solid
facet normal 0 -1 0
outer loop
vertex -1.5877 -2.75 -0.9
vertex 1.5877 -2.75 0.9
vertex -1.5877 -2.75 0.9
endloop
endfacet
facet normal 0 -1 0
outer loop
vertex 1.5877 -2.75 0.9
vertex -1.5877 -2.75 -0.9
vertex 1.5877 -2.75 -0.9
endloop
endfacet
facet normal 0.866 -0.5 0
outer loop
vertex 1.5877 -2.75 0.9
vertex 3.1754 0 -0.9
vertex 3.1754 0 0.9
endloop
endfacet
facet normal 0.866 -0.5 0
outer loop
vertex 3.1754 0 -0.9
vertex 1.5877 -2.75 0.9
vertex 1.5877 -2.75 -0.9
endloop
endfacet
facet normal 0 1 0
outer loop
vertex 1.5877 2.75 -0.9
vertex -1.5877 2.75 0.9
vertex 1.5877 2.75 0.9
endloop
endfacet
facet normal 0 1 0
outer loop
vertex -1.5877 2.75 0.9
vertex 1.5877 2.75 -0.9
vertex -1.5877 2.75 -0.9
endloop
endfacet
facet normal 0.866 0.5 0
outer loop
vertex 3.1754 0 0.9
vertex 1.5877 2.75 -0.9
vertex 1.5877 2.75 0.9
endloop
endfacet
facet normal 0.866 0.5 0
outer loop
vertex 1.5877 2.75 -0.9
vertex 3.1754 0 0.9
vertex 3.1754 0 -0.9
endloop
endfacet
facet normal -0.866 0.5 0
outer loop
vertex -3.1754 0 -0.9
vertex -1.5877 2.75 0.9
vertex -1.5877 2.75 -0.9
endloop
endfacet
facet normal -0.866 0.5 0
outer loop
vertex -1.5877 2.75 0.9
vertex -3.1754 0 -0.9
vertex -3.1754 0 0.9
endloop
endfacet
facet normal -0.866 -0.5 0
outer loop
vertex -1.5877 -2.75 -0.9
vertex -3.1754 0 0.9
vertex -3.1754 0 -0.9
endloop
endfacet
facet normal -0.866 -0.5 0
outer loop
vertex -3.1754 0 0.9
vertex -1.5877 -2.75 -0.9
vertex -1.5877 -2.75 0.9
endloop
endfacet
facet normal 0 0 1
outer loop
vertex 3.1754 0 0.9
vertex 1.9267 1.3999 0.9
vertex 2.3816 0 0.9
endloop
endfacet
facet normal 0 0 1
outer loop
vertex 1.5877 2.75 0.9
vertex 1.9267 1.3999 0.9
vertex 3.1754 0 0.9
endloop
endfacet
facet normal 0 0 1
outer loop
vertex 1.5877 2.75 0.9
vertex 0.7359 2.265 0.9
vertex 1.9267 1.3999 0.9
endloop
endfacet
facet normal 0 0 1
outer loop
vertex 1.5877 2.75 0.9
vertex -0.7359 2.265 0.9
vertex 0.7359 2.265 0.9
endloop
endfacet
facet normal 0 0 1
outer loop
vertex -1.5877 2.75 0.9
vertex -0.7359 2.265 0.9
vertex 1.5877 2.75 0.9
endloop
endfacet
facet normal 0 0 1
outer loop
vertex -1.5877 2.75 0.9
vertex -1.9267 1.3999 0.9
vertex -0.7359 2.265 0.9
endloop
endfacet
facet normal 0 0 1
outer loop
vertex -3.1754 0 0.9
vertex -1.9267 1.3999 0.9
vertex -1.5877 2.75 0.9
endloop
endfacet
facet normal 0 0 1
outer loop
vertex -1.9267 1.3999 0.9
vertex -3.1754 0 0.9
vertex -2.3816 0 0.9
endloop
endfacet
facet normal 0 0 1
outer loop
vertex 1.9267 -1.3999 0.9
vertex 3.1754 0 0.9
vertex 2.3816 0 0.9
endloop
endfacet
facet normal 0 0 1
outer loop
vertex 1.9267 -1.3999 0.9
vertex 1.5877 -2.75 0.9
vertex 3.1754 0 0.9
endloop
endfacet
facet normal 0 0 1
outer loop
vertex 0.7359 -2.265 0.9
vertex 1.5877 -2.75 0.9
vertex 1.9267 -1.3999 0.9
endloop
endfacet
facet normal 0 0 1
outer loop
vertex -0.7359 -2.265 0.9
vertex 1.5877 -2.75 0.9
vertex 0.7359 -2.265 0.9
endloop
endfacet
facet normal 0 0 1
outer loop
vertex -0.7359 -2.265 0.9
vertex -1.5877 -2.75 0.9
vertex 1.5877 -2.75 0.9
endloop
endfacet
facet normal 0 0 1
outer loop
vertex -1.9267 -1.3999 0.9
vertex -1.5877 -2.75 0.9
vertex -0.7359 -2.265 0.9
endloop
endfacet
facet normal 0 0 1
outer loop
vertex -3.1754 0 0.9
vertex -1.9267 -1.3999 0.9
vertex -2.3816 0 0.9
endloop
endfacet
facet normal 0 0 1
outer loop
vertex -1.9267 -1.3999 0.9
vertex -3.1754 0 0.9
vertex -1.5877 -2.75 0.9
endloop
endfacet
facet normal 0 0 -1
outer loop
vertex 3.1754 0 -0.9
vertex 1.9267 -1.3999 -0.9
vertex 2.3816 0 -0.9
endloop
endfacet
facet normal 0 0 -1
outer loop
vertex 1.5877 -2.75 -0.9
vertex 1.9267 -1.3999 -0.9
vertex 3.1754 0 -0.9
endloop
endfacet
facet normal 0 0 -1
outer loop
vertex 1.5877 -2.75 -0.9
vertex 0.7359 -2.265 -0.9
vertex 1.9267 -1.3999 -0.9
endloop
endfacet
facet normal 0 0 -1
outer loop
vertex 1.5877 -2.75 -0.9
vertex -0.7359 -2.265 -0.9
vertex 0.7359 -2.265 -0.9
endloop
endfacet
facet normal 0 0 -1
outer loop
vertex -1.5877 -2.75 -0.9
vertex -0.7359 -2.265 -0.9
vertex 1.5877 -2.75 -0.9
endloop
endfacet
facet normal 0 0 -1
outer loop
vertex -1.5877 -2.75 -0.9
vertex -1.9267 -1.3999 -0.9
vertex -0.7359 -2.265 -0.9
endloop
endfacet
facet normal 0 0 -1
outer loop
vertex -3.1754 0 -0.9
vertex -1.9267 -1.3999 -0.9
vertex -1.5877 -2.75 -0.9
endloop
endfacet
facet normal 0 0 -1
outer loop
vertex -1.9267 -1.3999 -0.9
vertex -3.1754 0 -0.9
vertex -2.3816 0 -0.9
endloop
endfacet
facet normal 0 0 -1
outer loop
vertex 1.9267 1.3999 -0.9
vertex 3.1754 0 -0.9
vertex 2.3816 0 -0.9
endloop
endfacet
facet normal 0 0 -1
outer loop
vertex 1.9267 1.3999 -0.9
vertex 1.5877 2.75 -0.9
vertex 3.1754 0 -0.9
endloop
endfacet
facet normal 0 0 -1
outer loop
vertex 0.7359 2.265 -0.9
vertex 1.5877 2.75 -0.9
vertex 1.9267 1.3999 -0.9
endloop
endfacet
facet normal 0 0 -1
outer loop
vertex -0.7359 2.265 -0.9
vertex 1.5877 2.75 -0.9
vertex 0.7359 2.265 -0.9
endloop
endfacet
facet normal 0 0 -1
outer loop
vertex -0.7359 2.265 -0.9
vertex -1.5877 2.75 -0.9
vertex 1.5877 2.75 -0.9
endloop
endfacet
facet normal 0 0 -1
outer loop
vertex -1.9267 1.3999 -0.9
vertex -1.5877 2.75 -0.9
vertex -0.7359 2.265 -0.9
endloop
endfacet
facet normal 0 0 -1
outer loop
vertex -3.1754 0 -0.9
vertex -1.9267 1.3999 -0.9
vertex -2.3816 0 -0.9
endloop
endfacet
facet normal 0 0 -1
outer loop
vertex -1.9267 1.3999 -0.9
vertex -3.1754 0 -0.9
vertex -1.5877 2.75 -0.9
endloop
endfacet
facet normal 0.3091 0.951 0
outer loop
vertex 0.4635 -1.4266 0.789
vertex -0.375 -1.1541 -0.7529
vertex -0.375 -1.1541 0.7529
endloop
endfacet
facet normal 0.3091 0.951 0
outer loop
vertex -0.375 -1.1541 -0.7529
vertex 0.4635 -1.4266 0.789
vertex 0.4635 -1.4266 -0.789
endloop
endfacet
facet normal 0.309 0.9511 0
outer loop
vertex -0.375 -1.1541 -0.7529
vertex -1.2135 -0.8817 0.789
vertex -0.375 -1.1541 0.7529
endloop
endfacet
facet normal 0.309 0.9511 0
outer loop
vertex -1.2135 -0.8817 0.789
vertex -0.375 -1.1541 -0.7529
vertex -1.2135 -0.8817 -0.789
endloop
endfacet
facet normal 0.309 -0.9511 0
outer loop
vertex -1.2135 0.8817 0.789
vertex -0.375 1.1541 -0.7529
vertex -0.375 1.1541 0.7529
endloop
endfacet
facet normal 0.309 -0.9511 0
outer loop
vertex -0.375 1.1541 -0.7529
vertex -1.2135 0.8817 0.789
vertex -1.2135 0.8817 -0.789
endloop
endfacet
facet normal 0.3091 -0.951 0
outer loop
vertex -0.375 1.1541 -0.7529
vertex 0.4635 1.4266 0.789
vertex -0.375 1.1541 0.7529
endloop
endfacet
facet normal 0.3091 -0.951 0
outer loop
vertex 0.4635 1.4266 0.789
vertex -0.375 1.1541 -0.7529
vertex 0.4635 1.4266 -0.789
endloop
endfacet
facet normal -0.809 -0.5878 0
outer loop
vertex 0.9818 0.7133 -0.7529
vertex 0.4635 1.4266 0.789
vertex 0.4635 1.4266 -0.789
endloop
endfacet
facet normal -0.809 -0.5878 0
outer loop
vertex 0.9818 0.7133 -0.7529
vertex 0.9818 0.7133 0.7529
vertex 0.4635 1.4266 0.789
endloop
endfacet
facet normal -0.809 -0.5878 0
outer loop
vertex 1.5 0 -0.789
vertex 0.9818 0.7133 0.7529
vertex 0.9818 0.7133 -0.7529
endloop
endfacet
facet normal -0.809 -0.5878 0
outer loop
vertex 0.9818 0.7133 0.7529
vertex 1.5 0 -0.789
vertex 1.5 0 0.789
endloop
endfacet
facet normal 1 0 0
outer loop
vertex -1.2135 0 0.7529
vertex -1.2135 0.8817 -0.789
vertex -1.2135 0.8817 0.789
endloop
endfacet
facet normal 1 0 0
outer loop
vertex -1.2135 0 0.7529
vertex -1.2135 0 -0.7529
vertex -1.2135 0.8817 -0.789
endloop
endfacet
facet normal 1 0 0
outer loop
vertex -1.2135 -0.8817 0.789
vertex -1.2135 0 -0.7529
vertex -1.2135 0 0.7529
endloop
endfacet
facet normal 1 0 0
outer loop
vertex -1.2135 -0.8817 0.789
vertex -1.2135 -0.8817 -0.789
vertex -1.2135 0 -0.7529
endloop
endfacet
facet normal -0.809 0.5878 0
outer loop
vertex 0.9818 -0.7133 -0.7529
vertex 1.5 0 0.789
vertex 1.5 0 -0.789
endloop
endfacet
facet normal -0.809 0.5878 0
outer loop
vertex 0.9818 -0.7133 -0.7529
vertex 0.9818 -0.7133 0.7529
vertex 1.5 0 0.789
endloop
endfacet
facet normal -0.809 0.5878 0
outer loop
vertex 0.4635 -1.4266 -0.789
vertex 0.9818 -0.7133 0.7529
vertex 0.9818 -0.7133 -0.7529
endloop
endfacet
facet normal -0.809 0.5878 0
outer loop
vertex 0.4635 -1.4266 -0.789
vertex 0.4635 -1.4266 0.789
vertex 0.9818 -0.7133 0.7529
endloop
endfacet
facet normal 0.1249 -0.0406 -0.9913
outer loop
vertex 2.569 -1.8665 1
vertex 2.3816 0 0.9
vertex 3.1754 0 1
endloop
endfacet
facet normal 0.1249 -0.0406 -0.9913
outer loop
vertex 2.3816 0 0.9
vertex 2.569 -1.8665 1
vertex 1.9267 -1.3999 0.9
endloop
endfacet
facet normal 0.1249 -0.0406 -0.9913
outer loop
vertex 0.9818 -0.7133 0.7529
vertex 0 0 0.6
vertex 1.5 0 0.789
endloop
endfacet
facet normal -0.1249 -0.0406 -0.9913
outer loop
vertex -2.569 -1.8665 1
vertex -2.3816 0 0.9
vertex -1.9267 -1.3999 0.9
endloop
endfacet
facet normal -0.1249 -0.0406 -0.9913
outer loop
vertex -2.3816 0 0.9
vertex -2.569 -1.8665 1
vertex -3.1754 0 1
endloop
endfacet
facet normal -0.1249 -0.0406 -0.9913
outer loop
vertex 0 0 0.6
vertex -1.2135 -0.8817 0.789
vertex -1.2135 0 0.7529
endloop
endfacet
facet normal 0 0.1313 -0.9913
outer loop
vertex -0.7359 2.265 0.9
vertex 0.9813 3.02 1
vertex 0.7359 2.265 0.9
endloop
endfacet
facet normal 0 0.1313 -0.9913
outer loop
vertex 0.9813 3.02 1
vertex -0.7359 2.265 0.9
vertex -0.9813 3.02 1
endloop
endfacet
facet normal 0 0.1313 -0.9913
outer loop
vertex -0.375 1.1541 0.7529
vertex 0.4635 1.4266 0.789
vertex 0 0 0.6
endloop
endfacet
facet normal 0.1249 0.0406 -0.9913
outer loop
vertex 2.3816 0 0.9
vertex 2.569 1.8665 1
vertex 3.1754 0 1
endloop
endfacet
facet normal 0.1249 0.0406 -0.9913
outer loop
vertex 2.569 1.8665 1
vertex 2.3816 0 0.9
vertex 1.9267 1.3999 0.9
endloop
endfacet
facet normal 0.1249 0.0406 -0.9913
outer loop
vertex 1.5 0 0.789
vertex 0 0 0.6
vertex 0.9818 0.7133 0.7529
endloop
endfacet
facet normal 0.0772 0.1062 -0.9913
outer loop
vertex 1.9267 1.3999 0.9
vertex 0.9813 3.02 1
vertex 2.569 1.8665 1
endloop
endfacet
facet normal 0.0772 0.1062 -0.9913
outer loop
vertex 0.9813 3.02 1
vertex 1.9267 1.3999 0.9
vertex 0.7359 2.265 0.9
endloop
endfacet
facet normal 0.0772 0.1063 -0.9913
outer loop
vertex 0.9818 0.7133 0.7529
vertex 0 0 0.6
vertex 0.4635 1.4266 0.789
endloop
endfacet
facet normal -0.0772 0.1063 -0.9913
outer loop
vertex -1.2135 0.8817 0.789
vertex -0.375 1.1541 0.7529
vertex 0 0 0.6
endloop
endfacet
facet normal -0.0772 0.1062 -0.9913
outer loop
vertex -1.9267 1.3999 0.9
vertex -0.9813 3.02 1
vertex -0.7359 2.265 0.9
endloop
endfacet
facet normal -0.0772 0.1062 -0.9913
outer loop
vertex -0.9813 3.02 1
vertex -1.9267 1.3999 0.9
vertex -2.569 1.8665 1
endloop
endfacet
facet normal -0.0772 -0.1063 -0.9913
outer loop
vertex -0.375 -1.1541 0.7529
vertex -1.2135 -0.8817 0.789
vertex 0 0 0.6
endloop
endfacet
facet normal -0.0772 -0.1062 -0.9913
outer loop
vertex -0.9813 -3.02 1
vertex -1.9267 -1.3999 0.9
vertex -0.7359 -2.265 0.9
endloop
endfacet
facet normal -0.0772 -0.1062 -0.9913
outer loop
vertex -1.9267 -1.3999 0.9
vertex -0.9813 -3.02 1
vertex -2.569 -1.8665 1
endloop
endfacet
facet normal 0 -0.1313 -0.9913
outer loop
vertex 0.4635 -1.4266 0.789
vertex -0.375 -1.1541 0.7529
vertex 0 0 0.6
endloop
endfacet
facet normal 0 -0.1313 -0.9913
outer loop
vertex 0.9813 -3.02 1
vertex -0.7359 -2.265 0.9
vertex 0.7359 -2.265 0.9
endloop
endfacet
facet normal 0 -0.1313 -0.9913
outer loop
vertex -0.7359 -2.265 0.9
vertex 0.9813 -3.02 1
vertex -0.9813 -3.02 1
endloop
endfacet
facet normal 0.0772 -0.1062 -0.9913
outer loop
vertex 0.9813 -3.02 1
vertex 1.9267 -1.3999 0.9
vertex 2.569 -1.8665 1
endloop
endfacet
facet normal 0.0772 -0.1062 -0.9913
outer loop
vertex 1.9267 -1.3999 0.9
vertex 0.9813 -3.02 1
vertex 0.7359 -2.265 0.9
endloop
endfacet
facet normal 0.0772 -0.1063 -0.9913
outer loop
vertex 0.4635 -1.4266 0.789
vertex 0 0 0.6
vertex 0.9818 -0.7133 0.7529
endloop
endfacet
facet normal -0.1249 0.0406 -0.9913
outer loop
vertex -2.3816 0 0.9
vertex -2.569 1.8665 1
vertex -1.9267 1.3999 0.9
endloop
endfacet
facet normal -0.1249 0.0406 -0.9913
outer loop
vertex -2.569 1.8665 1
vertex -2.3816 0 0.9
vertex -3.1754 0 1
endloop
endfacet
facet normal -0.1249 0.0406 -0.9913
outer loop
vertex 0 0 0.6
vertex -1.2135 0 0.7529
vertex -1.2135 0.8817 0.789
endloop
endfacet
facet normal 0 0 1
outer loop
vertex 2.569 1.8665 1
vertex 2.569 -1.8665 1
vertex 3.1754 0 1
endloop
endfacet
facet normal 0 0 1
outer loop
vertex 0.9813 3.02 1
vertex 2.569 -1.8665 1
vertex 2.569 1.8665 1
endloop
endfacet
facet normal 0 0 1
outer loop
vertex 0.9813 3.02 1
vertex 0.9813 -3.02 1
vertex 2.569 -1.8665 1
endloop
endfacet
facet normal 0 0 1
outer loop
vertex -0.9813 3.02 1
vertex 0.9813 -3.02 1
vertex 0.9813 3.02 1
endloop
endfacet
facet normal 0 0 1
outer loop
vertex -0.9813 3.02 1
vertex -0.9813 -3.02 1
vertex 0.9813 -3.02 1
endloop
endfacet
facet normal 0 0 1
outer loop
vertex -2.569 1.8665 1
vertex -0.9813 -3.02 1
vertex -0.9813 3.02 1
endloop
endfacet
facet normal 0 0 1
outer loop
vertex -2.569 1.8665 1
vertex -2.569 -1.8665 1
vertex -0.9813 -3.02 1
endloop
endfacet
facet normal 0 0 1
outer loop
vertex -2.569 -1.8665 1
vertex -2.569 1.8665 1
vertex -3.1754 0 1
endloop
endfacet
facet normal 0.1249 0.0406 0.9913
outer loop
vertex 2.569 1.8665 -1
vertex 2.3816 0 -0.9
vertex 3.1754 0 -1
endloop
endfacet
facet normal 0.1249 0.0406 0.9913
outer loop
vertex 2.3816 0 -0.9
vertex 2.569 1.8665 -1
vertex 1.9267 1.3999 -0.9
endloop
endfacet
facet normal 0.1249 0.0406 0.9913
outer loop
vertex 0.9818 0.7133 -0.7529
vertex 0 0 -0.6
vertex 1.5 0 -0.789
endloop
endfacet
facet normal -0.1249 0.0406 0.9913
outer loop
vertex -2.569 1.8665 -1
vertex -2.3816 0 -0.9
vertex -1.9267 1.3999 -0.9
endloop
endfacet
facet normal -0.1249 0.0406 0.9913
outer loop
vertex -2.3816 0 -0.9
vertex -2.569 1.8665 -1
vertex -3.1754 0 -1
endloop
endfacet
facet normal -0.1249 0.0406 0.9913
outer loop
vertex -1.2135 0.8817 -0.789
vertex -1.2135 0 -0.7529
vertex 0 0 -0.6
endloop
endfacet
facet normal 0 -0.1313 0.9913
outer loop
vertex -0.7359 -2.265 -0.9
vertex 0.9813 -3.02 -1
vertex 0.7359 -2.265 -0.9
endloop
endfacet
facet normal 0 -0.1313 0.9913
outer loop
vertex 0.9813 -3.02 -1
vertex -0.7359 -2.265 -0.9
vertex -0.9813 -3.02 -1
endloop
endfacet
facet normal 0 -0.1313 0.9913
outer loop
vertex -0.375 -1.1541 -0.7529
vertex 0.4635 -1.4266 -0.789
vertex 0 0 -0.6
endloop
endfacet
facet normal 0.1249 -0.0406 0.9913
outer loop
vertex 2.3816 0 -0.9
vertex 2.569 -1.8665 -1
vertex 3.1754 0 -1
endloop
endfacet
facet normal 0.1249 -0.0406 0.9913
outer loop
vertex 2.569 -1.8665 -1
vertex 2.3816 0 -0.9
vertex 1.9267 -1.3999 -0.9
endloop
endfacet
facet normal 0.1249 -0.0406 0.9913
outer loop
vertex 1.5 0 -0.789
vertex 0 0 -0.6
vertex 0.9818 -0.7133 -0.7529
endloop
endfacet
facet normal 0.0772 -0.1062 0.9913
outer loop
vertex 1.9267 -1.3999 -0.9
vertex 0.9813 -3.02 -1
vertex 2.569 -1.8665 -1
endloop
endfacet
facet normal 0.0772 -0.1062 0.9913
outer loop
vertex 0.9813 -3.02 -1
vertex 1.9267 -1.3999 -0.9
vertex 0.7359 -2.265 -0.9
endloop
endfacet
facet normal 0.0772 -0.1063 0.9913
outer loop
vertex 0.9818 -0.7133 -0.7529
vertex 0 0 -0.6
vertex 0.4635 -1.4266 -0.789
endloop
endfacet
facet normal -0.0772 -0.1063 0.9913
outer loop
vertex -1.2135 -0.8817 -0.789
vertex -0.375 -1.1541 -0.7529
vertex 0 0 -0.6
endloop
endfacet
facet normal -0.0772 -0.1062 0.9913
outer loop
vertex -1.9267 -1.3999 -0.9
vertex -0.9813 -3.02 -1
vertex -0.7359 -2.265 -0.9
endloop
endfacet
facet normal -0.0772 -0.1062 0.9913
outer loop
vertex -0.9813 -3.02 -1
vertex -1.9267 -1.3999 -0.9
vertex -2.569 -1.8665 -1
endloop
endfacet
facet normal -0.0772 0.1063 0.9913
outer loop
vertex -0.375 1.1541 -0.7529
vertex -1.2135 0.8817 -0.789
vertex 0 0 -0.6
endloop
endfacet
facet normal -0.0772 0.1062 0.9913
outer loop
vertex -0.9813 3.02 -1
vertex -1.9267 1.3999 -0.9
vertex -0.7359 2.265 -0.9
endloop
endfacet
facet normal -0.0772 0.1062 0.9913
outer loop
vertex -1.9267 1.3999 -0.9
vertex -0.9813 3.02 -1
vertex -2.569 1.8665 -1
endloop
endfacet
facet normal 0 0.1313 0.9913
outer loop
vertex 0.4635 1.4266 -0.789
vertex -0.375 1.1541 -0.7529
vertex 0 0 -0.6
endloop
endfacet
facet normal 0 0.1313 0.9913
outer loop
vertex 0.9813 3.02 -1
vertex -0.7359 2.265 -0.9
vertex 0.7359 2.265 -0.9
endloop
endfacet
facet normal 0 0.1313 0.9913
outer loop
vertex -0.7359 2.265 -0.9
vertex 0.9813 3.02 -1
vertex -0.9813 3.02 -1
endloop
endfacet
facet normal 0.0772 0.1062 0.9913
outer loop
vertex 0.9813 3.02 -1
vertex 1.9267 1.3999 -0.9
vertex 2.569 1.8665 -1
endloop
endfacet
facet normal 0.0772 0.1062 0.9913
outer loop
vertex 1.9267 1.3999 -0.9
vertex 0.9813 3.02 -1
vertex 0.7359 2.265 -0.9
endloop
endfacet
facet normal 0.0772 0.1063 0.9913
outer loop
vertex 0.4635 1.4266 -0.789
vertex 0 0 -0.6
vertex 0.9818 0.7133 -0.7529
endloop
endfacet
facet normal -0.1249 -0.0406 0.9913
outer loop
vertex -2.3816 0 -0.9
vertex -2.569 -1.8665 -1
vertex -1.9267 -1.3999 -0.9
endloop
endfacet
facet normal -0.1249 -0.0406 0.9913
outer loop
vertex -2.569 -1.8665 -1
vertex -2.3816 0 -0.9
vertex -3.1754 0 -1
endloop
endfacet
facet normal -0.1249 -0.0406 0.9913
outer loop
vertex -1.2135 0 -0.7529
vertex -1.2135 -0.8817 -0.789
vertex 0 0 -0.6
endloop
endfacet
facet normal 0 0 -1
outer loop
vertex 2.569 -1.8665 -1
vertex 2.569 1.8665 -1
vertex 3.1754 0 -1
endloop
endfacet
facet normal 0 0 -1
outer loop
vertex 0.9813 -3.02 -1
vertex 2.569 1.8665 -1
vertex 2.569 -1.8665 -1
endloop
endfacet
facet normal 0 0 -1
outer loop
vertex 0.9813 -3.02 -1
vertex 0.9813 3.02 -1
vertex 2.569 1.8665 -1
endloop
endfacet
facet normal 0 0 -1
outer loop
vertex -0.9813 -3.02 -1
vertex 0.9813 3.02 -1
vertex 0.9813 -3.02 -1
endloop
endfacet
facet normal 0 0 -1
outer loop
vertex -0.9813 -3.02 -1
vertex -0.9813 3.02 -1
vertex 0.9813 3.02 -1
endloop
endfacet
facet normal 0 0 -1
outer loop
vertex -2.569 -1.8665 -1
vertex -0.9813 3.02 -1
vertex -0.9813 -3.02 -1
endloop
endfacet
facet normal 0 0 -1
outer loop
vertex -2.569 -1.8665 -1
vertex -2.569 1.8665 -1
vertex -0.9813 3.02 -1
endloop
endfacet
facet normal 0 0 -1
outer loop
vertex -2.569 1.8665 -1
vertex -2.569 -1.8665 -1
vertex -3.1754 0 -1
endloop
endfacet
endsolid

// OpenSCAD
// Parameters
thread_diameter = 3.0; //[1.5:6.0:0.1]
thread_pitch = 0.5; //[0.25:1.0:0.05]
across_flats = 5.5; //[3.0:11.0:0.1]
thickness = 1.8; //[0.9:3.6:0.1]
tolerance_hole_diameter = 0.0; //[-0.2:0.6:0.05]
hole_diameter = 3.0; //[2.5:3.6:0.05]
chamfer_top = 0.2; //[0.0:0.6:0.05]
chamfer_bottom = 0.2; //[0.0:0.6:0.05]
eps = 0.2; //[0.05:0.5:0.05]
hex_circumradius = 3.1754264805429417; //[1.5:6.5:0.01]
hole_radius = 1.5; //[1.0:2.0:0.01]
chamfer_outer_radius = 3.1754264805429417; //[1.5:6.5:0.01]

// Nut and Washer - complete geometry
module nut_and_washer() {
  color("DimGray") {
    difference() {
      // Hex Nut Body
      cylinder(r=hex_circumradius, h=thickness, center=true, $fn=6);
      
      // Central Threaded Hole
      translate([0, 0, 0])
        cylinder(r=hole_radius, h=thickness + 2*eps, center=true);
    }
    
    // Top Chamfer
    translate([0, 0, thickness/2 - (chamfer_top + eps)/2 + eps/2])
      rotate([180, 0, 0])
      cylinder(r1=chamfer_outer_radius, r2=0, h=chamfer_top + eps, center=true);
    
    // Bottom Chamfer
    translate([0, 0, -thickness/2 + (chamfer_bottom + eps)/2 - eps/2])
      cylinder(r1=chamfer_outer_radius, r2=0, h=chamfer_bottom + eps, center=true);
  }
}

// Assembly
module assembly() {
  nut_and_washer();
}

assembly();
